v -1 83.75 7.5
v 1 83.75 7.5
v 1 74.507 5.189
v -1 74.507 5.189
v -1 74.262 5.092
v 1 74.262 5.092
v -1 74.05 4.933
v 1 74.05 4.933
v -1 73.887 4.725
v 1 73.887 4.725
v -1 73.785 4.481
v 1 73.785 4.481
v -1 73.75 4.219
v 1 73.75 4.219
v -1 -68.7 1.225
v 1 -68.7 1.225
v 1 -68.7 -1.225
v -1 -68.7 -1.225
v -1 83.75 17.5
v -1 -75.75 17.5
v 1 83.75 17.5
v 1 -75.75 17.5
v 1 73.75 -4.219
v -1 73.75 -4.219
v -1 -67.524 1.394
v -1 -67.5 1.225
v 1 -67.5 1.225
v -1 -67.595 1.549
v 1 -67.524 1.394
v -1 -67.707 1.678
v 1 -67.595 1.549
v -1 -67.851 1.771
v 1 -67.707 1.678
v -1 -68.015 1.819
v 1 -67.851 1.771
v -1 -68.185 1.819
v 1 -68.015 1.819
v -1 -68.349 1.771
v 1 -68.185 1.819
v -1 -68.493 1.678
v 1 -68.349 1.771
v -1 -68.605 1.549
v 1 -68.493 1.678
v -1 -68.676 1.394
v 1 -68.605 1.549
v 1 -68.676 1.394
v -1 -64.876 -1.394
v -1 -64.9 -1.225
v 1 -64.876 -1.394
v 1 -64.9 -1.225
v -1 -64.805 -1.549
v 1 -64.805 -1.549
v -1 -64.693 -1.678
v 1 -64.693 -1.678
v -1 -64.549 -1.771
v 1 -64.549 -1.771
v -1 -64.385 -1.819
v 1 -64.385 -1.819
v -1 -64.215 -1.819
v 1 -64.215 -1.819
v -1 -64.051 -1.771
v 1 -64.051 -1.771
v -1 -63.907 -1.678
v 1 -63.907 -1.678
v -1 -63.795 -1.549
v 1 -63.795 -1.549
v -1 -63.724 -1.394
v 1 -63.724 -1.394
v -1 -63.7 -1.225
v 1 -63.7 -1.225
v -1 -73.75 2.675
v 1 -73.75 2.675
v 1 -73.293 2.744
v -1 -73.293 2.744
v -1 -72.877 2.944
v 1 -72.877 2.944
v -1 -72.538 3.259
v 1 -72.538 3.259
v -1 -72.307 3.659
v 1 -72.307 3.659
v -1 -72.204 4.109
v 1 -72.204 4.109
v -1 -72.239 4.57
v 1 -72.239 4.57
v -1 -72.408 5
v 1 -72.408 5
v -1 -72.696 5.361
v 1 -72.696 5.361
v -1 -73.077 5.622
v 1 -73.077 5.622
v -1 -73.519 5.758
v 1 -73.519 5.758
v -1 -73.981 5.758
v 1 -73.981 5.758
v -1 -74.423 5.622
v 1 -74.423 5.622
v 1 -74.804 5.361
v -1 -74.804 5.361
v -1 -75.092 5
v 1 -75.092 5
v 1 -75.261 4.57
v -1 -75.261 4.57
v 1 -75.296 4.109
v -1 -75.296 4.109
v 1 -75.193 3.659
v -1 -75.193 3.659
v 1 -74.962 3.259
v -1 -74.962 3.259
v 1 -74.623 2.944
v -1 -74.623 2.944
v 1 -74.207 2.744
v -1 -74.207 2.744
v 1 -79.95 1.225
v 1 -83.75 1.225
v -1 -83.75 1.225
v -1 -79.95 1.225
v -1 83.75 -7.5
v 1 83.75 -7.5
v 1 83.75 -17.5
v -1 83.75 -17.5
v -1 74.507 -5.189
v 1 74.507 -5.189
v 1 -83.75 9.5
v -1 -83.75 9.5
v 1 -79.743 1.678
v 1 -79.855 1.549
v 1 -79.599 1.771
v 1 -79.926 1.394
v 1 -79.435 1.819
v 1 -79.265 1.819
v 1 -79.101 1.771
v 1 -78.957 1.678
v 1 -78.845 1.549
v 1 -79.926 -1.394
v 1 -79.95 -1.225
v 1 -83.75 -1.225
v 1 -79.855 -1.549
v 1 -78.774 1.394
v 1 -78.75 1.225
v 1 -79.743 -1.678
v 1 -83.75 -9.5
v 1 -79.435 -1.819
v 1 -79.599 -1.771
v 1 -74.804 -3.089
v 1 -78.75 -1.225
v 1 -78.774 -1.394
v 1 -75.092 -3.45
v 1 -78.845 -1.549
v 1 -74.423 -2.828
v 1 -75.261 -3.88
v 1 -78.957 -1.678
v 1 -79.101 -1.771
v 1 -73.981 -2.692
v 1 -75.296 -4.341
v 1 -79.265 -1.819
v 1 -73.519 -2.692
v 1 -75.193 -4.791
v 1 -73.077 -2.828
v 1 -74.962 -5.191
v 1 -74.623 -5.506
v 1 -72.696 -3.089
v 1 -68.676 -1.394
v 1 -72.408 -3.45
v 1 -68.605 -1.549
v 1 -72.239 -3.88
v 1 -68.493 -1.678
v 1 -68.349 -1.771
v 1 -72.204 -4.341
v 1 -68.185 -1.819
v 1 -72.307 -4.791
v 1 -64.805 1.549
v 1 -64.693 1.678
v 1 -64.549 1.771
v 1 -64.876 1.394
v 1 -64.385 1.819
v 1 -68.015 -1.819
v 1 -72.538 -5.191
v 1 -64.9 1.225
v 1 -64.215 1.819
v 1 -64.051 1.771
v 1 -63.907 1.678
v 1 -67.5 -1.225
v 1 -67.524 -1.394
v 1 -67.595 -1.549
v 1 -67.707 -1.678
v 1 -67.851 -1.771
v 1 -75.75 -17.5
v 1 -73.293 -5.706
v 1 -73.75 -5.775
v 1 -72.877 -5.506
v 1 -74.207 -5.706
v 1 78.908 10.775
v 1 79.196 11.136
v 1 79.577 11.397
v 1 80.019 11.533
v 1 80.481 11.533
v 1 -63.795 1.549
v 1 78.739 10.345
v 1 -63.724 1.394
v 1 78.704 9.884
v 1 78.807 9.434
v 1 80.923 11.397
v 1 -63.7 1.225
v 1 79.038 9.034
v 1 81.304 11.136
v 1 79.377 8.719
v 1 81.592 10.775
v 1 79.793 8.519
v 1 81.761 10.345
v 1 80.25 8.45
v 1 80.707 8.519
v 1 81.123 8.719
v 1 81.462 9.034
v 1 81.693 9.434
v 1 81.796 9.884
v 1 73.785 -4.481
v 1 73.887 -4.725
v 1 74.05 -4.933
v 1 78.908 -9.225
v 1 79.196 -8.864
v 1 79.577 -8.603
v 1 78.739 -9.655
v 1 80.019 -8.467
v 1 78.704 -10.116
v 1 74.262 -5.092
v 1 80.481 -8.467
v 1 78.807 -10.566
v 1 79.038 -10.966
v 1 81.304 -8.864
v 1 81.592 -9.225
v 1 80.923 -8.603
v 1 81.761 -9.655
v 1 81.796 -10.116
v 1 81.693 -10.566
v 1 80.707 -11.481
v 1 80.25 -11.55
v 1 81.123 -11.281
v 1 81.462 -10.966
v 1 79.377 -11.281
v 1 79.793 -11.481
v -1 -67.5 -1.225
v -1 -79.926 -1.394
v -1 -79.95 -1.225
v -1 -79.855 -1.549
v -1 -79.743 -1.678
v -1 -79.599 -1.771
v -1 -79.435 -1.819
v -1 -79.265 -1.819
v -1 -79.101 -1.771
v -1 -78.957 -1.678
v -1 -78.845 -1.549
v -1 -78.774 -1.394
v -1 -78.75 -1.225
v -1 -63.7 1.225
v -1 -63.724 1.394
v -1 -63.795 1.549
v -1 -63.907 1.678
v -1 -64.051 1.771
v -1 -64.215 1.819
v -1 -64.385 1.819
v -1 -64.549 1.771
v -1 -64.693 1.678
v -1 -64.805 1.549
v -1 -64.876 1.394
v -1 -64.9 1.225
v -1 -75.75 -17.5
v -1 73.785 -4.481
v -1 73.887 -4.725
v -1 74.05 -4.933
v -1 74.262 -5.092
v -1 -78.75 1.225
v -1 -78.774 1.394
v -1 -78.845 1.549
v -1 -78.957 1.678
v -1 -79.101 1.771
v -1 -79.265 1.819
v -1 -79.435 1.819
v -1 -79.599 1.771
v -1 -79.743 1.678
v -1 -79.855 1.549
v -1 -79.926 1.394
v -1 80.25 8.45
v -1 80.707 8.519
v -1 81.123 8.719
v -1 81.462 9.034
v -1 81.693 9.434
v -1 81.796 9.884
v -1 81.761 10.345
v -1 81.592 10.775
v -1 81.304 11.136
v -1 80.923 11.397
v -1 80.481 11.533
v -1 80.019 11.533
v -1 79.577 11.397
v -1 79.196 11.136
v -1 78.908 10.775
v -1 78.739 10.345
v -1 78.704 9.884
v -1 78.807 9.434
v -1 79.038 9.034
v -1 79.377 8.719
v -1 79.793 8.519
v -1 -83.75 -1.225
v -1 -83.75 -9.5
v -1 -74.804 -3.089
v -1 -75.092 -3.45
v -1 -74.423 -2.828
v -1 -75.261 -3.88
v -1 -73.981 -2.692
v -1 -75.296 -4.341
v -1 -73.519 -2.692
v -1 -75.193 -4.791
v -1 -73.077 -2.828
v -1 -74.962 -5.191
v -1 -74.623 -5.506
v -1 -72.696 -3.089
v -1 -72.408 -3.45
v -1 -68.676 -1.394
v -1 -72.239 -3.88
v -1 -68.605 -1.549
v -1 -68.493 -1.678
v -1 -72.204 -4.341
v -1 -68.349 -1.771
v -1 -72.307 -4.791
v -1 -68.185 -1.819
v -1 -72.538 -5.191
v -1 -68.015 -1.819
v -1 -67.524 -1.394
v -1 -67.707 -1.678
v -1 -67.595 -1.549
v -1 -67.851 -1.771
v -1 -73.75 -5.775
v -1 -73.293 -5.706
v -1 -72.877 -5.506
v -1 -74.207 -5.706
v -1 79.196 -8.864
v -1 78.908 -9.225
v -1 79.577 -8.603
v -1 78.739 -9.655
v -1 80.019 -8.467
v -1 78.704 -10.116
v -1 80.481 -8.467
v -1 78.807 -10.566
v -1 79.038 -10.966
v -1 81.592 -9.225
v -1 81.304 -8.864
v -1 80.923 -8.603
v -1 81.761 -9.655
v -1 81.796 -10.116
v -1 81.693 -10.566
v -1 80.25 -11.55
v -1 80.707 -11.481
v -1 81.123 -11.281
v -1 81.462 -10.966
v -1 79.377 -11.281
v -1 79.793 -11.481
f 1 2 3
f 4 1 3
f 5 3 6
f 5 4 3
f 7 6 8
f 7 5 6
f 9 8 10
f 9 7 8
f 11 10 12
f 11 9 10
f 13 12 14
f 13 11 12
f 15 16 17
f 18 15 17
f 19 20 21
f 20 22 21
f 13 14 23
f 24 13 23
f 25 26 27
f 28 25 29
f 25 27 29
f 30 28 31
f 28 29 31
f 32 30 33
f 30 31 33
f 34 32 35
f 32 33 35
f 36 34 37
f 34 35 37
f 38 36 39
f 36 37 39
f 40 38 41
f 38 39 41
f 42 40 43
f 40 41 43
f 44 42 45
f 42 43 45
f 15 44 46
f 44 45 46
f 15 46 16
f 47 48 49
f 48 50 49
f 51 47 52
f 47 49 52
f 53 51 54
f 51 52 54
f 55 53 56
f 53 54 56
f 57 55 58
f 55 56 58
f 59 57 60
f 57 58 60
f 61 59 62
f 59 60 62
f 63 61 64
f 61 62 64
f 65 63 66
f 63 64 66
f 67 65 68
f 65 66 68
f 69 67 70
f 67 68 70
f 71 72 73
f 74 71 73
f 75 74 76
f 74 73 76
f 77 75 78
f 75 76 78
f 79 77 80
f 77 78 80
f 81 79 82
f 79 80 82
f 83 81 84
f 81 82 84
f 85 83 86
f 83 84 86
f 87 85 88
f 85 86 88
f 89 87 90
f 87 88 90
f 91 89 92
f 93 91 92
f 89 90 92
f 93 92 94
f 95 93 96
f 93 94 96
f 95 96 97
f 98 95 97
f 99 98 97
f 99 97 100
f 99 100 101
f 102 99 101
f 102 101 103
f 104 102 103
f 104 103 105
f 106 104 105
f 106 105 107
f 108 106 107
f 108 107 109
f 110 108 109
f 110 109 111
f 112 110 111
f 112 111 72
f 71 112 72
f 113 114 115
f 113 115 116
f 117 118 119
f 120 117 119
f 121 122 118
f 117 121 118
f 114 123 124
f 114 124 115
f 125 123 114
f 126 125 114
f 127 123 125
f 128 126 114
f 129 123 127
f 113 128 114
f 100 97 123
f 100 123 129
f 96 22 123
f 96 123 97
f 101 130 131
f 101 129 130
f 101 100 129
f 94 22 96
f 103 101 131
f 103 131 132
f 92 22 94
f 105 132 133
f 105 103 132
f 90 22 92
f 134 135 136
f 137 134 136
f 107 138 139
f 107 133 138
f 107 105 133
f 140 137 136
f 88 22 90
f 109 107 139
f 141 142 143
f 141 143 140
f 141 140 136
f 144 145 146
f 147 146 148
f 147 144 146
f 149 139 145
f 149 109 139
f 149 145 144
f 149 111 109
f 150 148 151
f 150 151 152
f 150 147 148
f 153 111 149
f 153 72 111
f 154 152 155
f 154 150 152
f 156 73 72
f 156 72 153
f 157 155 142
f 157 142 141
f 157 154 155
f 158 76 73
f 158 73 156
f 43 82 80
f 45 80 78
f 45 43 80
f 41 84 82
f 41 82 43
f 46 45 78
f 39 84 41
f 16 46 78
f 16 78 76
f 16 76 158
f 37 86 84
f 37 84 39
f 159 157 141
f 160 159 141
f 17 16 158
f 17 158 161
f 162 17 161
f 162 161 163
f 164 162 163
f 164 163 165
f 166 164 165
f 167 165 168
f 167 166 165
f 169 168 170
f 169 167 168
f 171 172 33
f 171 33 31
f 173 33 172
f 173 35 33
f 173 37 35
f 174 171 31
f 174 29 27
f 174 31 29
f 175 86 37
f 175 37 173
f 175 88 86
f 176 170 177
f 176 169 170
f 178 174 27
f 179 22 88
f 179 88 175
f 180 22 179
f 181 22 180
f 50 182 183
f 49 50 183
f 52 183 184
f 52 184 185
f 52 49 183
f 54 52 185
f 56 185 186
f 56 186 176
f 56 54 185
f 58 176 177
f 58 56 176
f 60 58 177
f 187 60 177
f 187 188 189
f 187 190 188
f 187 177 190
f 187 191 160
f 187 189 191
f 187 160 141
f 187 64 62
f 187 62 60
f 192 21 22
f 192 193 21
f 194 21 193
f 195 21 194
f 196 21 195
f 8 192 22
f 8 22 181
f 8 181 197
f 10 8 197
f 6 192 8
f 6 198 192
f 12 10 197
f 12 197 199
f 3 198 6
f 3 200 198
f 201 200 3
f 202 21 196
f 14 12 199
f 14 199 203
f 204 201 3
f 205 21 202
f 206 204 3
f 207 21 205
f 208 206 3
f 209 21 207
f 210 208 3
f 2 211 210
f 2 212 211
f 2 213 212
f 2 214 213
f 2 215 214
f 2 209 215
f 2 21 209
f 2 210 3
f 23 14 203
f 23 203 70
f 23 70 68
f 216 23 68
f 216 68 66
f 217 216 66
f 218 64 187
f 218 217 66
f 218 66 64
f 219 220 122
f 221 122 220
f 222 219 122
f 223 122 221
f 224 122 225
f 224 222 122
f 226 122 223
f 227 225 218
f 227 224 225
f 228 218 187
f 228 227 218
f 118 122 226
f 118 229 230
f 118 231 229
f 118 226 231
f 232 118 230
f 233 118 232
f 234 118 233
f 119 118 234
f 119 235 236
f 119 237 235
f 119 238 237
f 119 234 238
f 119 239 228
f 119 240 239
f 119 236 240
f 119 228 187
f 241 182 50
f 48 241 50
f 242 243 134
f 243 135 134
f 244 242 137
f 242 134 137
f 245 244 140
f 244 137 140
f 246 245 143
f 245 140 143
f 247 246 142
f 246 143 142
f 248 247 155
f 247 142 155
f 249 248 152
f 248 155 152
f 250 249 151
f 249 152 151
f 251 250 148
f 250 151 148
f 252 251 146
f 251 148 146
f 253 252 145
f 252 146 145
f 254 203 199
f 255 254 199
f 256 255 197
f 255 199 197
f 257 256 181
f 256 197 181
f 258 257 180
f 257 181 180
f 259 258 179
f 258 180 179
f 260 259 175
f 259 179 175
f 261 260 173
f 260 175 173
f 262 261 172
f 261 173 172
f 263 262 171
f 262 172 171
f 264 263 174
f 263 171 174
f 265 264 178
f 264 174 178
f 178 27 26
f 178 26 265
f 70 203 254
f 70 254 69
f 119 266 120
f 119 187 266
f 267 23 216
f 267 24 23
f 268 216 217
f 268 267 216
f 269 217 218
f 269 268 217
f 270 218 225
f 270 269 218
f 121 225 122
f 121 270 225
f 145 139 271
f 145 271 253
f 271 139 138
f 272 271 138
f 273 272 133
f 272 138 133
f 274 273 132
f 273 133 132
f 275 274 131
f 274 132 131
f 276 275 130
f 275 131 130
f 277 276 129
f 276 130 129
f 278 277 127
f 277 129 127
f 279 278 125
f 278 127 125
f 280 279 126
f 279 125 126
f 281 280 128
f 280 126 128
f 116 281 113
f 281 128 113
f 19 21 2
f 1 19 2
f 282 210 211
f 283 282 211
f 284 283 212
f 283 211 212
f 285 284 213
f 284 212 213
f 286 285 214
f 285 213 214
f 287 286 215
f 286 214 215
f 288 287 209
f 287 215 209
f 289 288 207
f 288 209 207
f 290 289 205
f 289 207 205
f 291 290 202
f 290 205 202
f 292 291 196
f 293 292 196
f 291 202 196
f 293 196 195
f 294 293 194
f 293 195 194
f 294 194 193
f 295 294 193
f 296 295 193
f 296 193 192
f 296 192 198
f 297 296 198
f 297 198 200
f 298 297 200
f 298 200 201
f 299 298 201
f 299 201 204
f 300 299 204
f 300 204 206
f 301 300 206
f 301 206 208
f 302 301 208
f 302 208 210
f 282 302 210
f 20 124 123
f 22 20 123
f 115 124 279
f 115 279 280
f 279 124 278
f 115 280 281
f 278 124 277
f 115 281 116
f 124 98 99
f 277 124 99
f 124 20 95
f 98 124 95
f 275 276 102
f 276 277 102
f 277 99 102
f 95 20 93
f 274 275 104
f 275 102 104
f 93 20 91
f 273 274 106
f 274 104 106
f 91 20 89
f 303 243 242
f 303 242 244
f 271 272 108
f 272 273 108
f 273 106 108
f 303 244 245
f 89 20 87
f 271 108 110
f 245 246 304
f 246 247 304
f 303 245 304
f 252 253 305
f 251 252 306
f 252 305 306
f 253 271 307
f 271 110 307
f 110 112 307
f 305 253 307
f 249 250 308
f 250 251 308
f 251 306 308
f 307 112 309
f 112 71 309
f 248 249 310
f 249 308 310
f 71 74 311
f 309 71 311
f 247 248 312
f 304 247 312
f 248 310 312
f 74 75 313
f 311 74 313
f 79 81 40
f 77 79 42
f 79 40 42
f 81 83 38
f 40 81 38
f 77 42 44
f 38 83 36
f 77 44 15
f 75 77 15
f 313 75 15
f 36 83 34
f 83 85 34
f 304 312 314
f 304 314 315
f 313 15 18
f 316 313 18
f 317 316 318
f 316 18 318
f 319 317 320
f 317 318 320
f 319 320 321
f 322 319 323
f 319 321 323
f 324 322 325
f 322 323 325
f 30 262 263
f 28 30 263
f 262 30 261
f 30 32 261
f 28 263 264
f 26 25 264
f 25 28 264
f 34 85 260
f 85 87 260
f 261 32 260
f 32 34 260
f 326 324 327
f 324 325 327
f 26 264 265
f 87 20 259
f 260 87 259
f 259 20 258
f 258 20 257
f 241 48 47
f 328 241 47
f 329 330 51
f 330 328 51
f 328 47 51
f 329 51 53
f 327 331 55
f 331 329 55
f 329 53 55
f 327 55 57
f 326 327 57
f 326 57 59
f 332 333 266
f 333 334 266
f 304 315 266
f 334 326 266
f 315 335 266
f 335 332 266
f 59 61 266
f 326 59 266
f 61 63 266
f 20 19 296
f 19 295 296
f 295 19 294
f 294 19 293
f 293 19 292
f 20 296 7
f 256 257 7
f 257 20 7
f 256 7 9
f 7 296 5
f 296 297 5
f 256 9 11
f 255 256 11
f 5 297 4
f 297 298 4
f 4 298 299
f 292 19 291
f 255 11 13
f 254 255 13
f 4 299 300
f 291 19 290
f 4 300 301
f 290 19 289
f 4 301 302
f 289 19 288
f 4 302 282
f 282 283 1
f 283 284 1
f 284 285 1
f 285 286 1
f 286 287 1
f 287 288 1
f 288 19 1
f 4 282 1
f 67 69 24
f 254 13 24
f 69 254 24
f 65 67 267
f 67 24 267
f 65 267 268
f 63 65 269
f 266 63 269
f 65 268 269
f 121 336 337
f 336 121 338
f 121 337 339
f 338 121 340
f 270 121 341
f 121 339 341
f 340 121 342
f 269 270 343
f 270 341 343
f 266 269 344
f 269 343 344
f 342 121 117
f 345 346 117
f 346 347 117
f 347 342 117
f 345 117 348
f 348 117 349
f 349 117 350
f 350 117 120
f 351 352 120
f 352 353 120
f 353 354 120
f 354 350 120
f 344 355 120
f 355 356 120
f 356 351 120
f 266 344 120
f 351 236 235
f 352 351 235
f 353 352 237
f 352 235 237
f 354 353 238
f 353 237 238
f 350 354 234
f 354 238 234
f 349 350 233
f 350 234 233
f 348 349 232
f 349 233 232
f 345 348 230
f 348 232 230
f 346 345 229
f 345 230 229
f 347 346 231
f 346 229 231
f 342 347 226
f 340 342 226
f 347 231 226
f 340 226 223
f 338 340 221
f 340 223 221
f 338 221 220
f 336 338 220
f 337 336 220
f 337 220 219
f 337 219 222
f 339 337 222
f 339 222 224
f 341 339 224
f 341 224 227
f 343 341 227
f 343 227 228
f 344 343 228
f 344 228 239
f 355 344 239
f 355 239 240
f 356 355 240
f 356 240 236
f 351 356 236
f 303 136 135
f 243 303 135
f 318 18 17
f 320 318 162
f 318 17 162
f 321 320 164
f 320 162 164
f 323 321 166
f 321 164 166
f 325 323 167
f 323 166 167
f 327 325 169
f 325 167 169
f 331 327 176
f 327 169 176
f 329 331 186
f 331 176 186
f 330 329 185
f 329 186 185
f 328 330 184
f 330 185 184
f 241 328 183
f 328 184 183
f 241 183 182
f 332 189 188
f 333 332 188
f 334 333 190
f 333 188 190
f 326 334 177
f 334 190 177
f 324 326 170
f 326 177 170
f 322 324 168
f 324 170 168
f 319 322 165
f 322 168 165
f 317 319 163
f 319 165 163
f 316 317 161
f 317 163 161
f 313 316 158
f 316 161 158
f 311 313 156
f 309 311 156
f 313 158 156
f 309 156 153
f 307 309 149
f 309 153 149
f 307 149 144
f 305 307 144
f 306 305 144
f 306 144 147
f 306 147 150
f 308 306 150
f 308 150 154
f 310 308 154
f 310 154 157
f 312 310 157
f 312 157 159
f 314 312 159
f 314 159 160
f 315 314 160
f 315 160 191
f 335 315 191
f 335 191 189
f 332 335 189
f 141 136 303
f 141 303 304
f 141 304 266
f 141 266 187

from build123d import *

# Parameters (mm, degrees)
SKETCH_1_W          = 35
SKETCH_1_H          = 167.5
EXTRUDE_1_DEPTH     = 1
SKETCH_2_W          = 2.45
SKETCH_2_H          = 5
CUT_EXTRUDE_1_DEPTH = 3
SKETCH_3_R          = 0.6
CUT_EXTRUDE_2_DEPTH = 3
SKETCH_5_W          = 2.45
SKETCH_5_H          = 5
CUT_EXTRUDE_4_DEPTH = 3
SKETCH_6_R          = 0.6
CUT_EXTRUDE_5_DEPTH = 3
SKETCH_7_R          = 1.55
CUT_EXTRUDE_6_DEPTH = 3
CHAMFER_1_SIZE      = 8
CUT_EXTRUDE_8_DEPTH = 3
FILLET_1_R          = 1
SKETCH_11_R         = 1.55
CUT_EXTRUDE_9_DEPTH = 3


with BuildPart() as part:
    # 草图1 → 凸台-拉伸1 (new body, symmetric)
    with BuildSketch(Plane(origin=(0, 0, 0), x_dir=(0, 0, -1), z_dir=(1, 0, 0))):
        Rectangle(SKETCH_1_W, SKETCH_1_H)
    extrude(amount=EXTRUDE_1_DEPTH, both=True)

    # 草图2 → 切除-拉伸1 (cut, through all)
    with BuildSketch(Plane(origin=(1, 0, 0), x_dir=(0, 0, -1), z_dir=(1, 0, 0))):
        with Locations((0, -81.25)):
            Rectangle(SKETCH_2_W, SKETCH_2_H)
    extrude(amount=-CUT_EXTRUDE_1_DEPTH, mode=Mode.SUBTRACT)

    # 草图3 → 切除-拉伸2 (cut, through all)
    with BuildSketch(Plane(origin=(1, 0, 0), x_dir=(0, 0, -1), z_dir=(1, 0, 0))):
        with Locations((-1.225, -79.35)):
            Circle(SKETCH_3_R)
        with Locations((1.225, -79.35)):
            Circle(SKETCH_3_R)
    extrude(amount=-CUT_EXTRUDE_2_DEPTH, mode=Mode.SUBTRACT)

    # 草图5 → 切除-拉伸4 (cut, through all)
    with BuildSketch(Plane(origin=(1, 0, 0), x_dir=(0, 0, -1), z_dir=(1, 0, 0))):
        with Locations((0, -66.2)):
            Rectangle(SKETCH_5_W, SKETCH_5_H)
    extrude(amount=-CUT_EXTRUDE_4_DEPTH, mode=Mode.SUBTRACT)

    # 草图6 → 切除-拉伸5 (cut, through all)
    with BuildSketch(Plane(origin=(1, 0, 0), x_dir=(0, 0, -1), z_dir=(1, 0, 0))):
        with Locations((-1.225, -64.3)):
            Circle(SKETCH_6_R)
        with Locations((-1.225, -68.1)):
            Circle(SKETCH_6_R)
        with Locations((1.225, -64.3)):
            Circle(SKETCH_6_R)
        with Locations((1.225, -68.1)):
            Circle(SKETCH_6_R)
    extrude(amount=-CUT_EXTRUDE_5_DEPTH, mode=Mode.SUBTRACT)

    # 草图7 → 切除-拉伸6 (cut, through all)
    with BuildSketch(Plane(origin=(1, 0, 0), x_dir=(0, 0, -1), z_dir=(1, 0, 0))):
        with Locations((-4.225, -73.75)):
            Circle(SKETCH_7_R)
        with Locations((4.225, -73.75)):
            Circle(SKETCH_7_R)
    extrude(amount=-CUT_EXTRUDE_6_DEPTH, mode=Mode.SUBTRACT)

    # 倒角1
    chamfer_1_edges = [part.edges().sort_by_distance(p)[0] for p in [
        (0, -83.75, -17.5),
        (0, -83.75, 17.5),
    ]]
    chamfer(chamfer_1_edges, length=CHAMFER_1_SIZE)

    # 草图10 → 切除-拉伸8 (cut, through all)
    with BuildSketch(Plane(origin=(1, 0, 0), x_dir=(0, 0, -1), z_dir=(1, 0, 0))):
        Polygon((7.5, 83.75), (-7.5, 83.75), (-5, 73.75), (5, 73.75), align=None)
    extrude(amount=-CUT_EXTRUDE_8_DEPTH, mode=Mode.SUBTRACT)

    # 圆角1
    fillet_1_edges = [part.edges().sort_by_distance(p)[0] for p in [
        (0, 73.75, 5),
        (0, 73.75, -5),
    ]]
    fillet(fillet_1_edges, radius=FILLET_1_R)

    # 草图11 → 切除-拉伸9 (cut, through all)
    with BuildSketch(Plane(origin=(1, 0, 0), x_dir=(0, 0, -1), z_dir=(1, 0, 0))):
        with Locations((-10, 80.25)):
            Circle(SKETCH_11_R)
        with Locations((10, 80.25)):
            Circle(SKETCH_11_R)
    extrude(amount=-CUT_EXTRUDE_9_DEPTH, mode=Mode.SUBTRACT)


solid = part.part
